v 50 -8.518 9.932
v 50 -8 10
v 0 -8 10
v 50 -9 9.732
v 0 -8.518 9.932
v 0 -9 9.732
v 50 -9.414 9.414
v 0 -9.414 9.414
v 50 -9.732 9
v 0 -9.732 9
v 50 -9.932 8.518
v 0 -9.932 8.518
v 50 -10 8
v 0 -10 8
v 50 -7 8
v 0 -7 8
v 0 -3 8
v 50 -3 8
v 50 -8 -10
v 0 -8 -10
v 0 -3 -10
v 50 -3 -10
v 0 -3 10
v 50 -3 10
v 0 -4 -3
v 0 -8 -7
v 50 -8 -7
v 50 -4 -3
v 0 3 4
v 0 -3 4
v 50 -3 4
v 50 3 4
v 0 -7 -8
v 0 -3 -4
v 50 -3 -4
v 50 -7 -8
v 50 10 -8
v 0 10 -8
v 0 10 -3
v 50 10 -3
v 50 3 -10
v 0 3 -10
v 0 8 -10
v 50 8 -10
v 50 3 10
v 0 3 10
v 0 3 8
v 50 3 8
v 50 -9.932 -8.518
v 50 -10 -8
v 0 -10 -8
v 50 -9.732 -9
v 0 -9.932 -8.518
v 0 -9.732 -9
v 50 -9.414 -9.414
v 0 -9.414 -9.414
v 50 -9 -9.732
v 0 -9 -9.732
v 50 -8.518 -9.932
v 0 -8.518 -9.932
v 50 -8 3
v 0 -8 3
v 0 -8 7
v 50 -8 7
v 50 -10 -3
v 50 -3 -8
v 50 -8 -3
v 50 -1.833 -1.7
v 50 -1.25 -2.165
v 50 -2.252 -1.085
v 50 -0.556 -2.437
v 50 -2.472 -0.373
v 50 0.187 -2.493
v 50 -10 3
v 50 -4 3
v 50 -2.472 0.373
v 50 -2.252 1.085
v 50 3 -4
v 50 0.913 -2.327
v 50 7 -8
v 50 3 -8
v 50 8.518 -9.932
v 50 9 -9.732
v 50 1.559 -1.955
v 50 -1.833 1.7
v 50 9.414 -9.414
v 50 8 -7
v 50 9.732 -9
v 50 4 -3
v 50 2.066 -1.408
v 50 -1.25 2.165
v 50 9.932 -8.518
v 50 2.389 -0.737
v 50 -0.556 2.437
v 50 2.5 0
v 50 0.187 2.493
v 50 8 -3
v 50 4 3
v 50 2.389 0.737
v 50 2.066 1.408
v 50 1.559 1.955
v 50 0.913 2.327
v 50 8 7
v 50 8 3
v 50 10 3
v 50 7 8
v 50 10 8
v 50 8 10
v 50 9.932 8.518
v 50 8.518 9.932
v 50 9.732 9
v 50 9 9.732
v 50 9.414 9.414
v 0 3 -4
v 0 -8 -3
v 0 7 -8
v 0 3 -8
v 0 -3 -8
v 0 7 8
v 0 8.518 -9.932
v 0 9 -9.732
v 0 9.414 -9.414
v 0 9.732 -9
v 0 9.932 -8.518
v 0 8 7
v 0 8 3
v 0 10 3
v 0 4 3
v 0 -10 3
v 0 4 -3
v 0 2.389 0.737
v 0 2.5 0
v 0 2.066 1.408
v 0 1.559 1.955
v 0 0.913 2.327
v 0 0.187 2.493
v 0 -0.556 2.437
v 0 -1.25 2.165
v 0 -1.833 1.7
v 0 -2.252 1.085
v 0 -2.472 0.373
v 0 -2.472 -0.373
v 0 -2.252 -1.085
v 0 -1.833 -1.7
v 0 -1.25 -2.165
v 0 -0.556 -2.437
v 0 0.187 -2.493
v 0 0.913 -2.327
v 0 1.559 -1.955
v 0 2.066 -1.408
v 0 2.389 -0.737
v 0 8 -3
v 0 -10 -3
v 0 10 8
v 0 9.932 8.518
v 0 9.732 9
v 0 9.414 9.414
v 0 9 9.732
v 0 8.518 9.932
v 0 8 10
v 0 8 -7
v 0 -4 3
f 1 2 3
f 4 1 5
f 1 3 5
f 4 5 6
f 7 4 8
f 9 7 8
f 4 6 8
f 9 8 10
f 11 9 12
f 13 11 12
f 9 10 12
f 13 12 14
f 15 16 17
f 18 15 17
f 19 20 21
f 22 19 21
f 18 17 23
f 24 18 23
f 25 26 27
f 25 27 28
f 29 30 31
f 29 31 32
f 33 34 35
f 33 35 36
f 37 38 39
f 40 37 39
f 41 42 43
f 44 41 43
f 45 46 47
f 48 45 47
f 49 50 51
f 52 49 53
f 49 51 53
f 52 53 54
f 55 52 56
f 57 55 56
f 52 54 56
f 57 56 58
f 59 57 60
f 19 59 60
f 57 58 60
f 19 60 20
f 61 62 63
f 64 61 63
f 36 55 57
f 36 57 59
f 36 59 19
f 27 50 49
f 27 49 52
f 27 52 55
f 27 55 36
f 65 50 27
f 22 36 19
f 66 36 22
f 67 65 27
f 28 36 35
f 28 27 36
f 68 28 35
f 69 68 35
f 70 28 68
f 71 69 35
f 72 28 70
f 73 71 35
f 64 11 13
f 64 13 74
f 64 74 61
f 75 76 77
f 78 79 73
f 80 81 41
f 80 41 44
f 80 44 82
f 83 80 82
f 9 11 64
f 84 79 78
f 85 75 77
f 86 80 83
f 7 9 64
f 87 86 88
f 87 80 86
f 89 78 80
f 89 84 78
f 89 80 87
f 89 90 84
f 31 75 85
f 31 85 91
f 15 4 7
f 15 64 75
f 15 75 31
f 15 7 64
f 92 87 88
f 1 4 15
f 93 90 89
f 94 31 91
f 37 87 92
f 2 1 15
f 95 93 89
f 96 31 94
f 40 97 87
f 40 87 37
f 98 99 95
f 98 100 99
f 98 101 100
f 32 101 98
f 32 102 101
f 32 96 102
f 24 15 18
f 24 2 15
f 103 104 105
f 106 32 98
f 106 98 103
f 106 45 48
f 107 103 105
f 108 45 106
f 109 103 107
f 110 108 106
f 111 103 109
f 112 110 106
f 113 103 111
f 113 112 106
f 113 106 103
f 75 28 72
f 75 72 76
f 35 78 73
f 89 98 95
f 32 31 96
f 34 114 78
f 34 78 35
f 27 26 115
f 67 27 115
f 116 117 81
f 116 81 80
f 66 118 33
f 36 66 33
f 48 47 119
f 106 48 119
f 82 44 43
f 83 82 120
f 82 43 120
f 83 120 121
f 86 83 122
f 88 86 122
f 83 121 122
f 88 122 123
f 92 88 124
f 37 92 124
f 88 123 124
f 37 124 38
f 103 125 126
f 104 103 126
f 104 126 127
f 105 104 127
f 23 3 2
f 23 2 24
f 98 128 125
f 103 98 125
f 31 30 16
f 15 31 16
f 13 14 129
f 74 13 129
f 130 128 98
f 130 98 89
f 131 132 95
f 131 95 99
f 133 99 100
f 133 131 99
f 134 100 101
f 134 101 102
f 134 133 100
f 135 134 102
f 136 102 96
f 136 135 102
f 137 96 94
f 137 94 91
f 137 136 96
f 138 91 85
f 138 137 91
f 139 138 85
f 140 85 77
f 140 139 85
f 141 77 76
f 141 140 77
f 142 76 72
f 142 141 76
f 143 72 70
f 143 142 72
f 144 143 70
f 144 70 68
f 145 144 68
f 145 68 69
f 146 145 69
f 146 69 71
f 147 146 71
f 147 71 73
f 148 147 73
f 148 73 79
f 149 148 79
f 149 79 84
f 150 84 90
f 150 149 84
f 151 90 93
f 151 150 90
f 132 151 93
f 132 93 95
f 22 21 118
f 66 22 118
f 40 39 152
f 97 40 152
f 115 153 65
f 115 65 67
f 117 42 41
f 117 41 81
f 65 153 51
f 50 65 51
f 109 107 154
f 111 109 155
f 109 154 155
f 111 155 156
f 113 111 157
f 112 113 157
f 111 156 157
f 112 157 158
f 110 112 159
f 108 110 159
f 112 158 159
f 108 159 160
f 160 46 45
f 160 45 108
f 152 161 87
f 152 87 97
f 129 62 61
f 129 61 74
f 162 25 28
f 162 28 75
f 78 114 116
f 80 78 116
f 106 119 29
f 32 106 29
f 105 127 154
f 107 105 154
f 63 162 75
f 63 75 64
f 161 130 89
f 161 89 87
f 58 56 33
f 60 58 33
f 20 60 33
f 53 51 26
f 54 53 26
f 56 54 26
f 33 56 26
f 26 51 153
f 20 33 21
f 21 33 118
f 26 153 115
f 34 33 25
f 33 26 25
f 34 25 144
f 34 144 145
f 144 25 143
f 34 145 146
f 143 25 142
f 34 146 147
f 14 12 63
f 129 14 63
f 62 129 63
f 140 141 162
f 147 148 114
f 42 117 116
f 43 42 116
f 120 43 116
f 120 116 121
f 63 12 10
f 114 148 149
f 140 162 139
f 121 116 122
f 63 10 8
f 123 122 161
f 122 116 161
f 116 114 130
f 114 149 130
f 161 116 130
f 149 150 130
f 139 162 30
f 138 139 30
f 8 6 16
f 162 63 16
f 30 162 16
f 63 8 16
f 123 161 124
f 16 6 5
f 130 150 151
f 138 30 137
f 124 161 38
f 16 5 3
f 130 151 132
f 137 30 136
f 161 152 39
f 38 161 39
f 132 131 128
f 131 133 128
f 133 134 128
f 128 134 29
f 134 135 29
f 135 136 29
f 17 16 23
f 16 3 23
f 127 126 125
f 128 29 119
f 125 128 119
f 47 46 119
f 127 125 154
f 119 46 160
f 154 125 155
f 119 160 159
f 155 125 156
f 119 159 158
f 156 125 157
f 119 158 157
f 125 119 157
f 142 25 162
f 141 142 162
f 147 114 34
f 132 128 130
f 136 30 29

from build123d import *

# Parameters (mm, degrees)
SKETCH_R  = 2.5
PAD_DEPTH = 50


with BuildPart() as part:
    # Sketch → Pad (new body)
    with BuildSketch(Plane.YZ):
        with BuildLine():
            ThreePointArc((-8, 10), (-9.414214, 9.414214), (-10, 8))
            Line((-10, 8), (-10, 3))
            Line((-8, 3), (-10, 3))
            Line((-8, 3), (-8, 7))
            Line((-4, 3), (-8, 7))
            Line((-4, -3), (-4, 3))
            Line((-8, -7), (-4, -3))
            Line((-8, -7), (-8, -3))
            Line((-10, -3), (-8, -3))
            Line((-10, -3), (-10, -8))
            ThreePointArc((-10, -8), (-9.414214, -9.414214), (-8, -10))
            Line((-8, -10), (-3, -10))
            Line((-3, -10), (-3, -8))
            Line((-3, -8), (-7, -8))
            Line((-3, -4), (-7, -8))
            Line((3, -4), (-3, -4))
            Line((3, -4), (7, -8))
            Line((3, -8), (7, -8))
            Line((3, -10), (3, -8))
            Line((3, -10), (8, -10))
            ThreePointArc((8, -10), (9.414214, -9.414214), (10, -8))
            Line((10, -8), (10, -3))
            Line((10, -3), (8, -3))
            Line((8, -7), (8, -3))
            Line((4, -3), (8, -7))
            Line((4, 3), (4, -3))
            Line((4, 3), (8, 7))
            Line((8, 7), (8, 3))
            Line((8, 3), (10, 3))
            Line((10, 3), (10, 8))
            ThreePointArc((10, 8), (9.414214, 9.414214), (8, 10))
            Line((3, 10), (8, 10))
            Line((3, 10), (3, 8))
            Line((3, 8), (7, 8))
            Line((7, 8), (3, 4))
            Line((-3, 4), (3, 4))
            Line((-3, 4), (-7, 8))
            Line((-7, 8), (-3, 8))
            Line((-3, 8), (-3, 10))
            Line((-8, 10), (-3, 10))
        make_face()
        Circle(SKETCH_R, mode=Mode.SUBTRACT)
    extrude(amount=PAD_DEPTH)


solid = part.part
